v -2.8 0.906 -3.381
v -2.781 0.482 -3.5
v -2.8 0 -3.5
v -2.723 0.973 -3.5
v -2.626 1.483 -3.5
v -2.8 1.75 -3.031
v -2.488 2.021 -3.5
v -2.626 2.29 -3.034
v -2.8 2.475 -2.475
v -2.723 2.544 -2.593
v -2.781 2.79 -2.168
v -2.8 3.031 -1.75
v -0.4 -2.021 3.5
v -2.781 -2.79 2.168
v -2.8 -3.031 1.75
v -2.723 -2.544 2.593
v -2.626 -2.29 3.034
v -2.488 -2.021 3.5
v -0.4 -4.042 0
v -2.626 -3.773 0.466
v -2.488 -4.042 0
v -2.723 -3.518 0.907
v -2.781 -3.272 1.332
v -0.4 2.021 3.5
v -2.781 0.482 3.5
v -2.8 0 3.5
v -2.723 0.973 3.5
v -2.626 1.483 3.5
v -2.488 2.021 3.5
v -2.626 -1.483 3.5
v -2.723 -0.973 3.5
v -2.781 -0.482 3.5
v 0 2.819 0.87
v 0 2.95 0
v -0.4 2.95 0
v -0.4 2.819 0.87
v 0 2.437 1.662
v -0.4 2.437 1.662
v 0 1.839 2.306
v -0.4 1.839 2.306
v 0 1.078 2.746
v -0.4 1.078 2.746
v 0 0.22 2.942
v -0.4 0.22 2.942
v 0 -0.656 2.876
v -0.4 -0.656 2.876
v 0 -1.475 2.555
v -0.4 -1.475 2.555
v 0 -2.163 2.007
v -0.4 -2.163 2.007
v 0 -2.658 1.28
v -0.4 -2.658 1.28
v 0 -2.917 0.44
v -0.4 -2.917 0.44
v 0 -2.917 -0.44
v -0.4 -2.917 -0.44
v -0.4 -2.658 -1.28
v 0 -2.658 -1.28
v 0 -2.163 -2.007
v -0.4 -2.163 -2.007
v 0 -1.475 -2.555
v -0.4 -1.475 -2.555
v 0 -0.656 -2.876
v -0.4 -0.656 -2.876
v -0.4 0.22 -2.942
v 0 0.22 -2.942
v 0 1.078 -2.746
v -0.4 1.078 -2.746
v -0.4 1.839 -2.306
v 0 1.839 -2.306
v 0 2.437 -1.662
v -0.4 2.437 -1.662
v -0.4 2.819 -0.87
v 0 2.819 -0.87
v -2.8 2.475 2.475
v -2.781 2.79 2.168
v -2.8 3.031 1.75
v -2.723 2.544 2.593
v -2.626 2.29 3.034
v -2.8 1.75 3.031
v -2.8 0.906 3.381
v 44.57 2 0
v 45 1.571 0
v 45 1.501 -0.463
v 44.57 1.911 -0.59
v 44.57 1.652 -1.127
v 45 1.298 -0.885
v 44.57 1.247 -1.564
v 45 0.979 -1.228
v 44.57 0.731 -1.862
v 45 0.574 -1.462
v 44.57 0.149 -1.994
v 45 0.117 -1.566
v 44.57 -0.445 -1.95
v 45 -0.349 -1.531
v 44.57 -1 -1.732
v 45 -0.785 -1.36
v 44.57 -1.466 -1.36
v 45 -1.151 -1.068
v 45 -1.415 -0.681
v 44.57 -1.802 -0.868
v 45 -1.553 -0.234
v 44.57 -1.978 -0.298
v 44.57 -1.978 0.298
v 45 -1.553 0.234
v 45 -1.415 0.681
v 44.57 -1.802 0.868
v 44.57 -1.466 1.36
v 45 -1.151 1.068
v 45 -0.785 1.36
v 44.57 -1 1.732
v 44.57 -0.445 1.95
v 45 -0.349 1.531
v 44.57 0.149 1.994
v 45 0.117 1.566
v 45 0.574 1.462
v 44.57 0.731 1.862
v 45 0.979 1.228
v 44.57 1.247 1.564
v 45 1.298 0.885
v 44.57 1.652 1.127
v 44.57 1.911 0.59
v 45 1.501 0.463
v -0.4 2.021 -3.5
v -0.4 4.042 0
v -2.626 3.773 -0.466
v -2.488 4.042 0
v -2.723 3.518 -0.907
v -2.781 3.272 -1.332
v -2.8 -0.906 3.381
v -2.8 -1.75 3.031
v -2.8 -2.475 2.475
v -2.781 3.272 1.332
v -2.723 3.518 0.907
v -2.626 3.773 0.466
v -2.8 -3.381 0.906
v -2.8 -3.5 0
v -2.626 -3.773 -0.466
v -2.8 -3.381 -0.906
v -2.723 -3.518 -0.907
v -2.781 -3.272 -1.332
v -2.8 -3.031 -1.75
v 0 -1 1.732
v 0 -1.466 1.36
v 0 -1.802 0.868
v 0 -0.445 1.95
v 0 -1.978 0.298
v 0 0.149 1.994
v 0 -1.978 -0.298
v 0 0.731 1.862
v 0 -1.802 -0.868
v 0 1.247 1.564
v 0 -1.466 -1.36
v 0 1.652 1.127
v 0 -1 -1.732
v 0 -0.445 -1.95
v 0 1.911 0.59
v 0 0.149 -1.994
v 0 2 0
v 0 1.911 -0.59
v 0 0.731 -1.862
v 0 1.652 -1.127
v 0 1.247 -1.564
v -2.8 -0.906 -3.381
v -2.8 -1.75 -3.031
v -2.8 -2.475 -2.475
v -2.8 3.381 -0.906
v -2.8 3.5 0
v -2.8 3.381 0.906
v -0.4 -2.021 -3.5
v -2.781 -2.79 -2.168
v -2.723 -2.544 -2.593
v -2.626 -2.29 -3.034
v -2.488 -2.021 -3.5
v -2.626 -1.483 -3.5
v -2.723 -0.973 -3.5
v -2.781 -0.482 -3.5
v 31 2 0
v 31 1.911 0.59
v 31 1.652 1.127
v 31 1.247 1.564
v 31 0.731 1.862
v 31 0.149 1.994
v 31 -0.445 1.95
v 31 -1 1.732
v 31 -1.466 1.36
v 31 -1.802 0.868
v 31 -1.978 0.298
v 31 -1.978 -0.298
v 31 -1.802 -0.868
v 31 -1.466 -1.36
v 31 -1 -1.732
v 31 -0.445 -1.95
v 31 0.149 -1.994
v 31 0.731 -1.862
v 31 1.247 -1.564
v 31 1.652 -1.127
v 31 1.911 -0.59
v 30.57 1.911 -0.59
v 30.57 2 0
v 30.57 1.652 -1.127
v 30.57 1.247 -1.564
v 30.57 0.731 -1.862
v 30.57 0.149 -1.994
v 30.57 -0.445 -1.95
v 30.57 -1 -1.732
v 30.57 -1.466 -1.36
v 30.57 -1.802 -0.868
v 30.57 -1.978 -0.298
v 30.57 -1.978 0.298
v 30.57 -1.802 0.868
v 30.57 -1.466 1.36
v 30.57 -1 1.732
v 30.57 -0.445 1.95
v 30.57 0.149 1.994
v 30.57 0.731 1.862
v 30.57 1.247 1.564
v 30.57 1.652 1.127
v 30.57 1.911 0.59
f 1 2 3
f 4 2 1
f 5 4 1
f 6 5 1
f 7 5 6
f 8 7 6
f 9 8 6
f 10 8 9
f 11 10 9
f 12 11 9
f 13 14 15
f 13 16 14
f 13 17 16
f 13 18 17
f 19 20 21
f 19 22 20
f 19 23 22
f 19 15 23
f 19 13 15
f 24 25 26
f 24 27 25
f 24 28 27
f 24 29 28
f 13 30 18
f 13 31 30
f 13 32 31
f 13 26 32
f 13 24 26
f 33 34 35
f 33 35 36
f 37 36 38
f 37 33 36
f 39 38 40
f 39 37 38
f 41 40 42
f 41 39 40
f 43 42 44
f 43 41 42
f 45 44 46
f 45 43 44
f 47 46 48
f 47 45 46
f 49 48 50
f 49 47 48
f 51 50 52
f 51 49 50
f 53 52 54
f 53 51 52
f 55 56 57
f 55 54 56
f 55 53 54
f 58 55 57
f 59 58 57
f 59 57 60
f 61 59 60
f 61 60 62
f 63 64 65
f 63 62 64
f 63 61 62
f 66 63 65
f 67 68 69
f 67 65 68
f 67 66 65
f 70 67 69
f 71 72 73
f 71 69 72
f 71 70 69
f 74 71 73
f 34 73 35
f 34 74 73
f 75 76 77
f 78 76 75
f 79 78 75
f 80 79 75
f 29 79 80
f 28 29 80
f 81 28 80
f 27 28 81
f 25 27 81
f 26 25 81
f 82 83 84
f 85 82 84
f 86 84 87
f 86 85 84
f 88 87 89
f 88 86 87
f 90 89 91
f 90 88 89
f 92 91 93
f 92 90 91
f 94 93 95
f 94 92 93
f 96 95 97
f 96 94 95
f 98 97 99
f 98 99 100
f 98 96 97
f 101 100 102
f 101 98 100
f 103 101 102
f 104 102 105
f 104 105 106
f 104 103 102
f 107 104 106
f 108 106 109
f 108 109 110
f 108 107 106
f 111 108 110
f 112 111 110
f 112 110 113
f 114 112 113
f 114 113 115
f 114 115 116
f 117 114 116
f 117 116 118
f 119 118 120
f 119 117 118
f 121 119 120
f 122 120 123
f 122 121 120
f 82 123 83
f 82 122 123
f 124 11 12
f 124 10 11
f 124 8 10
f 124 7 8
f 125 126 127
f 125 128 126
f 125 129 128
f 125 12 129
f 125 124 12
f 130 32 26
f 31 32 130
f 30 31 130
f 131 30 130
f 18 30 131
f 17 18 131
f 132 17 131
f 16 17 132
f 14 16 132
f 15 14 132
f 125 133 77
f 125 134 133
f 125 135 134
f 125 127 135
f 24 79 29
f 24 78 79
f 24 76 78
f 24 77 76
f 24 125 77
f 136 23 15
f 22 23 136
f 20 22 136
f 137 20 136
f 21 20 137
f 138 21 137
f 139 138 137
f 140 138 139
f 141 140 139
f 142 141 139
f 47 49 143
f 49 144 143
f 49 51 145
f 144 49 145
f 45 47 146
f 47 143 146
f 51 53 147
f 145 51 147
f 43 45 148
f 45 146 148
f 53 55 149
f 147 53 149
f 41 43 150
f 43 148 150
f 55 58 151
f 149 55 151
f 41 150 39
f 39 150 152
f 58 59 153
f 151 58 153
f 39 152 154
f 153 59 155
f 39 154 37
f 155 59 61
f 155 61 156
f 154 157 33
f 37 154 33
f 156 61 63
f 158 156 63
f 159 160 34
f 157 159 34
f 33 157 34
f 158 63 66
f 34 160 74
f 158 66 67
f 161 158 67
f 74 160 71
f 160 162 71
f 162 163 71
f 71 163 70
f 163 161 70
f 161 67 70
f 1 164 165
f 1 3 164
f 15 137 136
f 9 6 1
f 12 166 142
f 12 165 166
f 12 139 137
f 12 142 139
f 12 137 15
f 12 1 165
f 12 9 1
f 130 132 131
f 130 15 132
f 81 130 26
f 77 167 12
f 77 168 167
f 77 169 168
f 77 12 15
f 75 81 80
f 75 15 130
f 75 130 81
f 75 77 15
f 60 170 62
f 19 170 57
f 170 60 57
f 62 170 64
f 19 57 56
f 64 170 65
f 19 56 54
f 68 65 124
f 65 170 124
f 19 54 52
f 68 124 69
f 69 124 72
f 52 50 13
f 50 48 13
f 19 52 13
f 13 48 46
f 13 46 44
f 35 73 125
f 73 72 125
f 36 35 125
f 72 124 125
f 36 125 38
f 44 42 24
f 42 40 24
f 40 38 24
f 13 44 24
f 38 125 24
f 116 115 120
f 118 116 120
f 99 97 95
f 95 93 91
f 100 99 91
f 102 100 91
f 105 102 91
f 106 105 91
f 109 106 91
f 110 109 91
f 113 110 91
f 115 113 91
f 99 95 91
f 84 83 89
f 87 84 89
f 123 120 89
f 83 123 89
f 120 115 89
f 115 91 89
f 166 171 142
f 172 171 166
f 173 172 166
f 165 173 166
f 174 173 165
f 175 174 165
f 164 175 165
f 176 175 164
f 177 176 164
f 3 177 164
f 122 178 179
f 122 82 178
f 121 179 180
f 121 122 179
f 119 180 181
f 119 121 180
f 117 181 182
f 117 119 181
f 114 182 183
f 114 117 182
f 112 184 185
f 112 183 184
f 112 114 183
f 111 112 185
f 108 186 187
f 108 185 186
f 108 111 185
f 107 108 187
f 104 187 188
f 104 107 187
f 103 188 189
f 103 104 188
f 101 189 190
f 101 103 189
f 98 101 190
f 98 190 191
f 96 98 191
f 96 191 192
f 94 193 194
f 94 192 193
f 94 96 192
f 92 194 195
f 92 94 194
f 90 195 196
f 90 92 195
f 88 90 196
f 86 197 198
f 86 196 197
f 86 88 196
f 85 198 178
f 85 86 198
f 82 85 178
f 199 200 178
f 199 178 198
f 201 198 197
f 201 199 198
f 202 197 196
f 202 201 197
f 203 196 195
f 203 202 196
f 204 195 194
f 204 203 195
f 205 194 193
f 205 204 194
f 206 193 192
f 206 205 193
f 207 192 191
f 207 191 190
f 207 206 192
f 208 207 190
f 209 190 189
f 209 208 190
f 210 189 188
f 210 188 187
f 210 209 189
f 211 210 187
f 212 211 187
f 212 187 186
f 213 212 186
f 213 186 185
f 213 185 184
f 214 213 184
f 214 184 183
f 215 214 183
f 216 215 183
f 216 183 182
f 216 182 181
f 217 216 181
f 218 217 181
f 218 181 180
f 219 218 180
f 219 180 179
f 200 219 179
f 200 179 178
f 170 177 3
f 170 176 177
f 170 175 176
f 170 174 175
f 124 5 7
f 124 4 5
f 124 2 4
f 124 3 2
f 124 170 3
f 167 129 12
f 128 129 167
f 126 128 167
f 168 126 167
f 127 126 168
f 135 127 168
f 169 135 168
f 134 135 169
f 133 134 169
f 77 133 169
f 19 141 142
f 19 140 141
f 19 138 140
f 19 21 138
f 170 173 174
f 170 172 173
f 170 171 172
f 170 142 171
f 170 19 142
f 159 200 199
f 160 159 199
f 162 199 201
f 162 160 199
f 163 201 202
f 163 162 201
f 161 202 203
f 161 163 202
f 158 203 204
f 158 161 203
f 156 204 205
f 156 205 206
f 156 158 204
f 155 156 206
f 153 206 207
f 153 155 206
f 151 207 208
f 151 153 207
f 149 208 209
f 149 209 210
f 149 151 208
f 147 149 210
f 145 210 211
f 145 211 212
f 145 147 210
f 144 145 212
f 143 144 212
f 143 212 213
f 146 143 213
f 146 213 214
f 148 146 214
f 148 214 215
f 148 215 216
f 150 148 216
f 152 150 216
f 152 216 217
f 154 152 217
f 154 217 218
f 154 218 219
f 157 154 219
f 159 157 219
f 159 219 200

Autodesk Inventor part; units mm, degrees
ref_plane "YZ Plane" through (0, 0, 0) normal (1, 0, 0) x (0, 1, 0)
ref_plane "XZ Plane" through (0, 0, 0) normal (0, 1, 0) x (-1, 0, 0)
sketch "Boceto1" plane through (0, 0, 0) normal (0, 0, 1) x (1, 0, 0)
  line L0 (0, 2.95) -> (0, 2)
  line L1 (31, 2) -> (45, 2)
  line L2 (45, 2) -> (45, 0)
  line L3 (45, 0) -> (-0.4001, 0)
  line L4 (-9.4801, 0) -> (54.08, 0) projected
  line L5 (-0.4001, 0) -> (-0.4001, 2.95)
  line L6 (-0.4001, 2.95) -> (0, 2.95)
  line L7 (31, 2) -> (30.5705, 2)
  line L8 (30.5705, 2) -> (0, 2)
  line L9 (0, -0.59) -> (0, 3.54) projected
  dimension "d0" = 45
  dimension "d1" = 14
  dimension "d2" = 4
  dimension "d9" = 0.4001
  dimension "d10" = 5.9
  dimension "d13" = 0.4295
  dimension "d14" = 4
revolve "Cuerpo" add sketch "Boceto1" angle 360 about axis through (45, 0, 0) along (-1, 0, 0)
sketch "Boceto2" plane through (-0.4001, 0, 0) normal (-1, 0, 0) x (0, 0, 1)
  line L0 (0, 4.0415) -> (3.5, 2.0207)
  line L1 (3.5, 2.0207) -> (3.5, -2.0207)
  line L2 (3.5, -2.0207) -> (0, -4.0415)
  line L3 (0, -4.0415) -> (-3.5, -2.0207)
  line L4 (-3.5, -2.0207) -> (-3.5, 2.0207)
  line L5 (-3.5, 2.0207) -> (0, 4.0415)
  point P0 (0, 0)
  point P1 (0, 0)
  dimension "d11" = 7
extrude "Cabeza" add sketch "Boceto2" along normal blind 2.4
sketch "Boceto4" plane through (0, 0, 0) normal (0, 0, 1) x (1, 0, 0)
  line L0 (-2.8001, 3.5) -> (-2.8001, 4.0415)
  line L1 (-2.8001, 4.0415) -> (-2.4875, 4.0415)
  line L2 (-2.4875, 4.0415) -> (-2.8001, 3.5)
  line L3 (-3.2801, 0) -> (0.0799, 0) projected
  line L4 (-0.4001, 4.0415) -> (-2.8001, 4.0415) projected
  line L5 (-2.8001, 2.0207) -> (-2.8001, 4.0415) projected
  dimension "d5" = 30
  dimension "d19" = 7
revolve "Chaflán1" cut sketch "Boceto4" angle 360 about axis through (-10, 0, 0) along (1, 0, 0)
thread "Rosca" size "M4x0.7" class "6g" standard "ISO Metric profile" length 14
chamfer "Chaflán2" distance 0.4294 distance2 0.4295 1 edges at (45, -2, 0) measured on face at (45, -0.2364, -0.6233)
ref_plane "Work Plane1" through (1.525, 0, 0) normal (0, 0, 1) x (1, 0, 0)
equation "\"d1\" = GEL"
equation "\"d2\" = GD"
equation "\"d10\" = SD2"
equation "\"d14\" = BDM"
equation "\"d11\" = SW"
equation "\"d3\" = KOH - SD"
equation "\"d5\" = ANG1"
equation "\"d19\" = SW0"
equation "\"d15\" = GEL"
equation "\"d6\" = -0.5 * SPD + 0.5 * GD"
equation "\"NLG\" = 25"
equation "\"GD\" = NND"
equation "\"BDM\" = NND"
equation "\"KOH\" = 2.8"
equation "\"GEL\" = 14"
equation "\"SW\" = 7"
equation "\"SW0\" = SW"
equation "\"SPD\" = NND - 1.2269 * PTC"
equation "\"SD2\" = SDH"
equation "\"SD\" = 0.4"
equation "\"ANG1\" = 30deg"
equation "\"GAL\" = 0.61345 * PTC"
equation "\"GUL\" = 0.61345 * PTC"
equation "\"RR\" = 0.15"
equation "\"WFT\" = RR"
equation "\"GD1\" = THREADDIA - 1.2269 * PTC"
equation "\"THREADDIA\" = 4"
equation "\"SDH\" = 5.9"
equation "\"TOA\" = 30deg"
equation "\"PTC\" = 0.7"
equation "\"NND\" = 4"
equation "\"E0\" = 1.155 * SW"
properties part number "UNI 5737 - M4 x 25" material "Acero, suave"
